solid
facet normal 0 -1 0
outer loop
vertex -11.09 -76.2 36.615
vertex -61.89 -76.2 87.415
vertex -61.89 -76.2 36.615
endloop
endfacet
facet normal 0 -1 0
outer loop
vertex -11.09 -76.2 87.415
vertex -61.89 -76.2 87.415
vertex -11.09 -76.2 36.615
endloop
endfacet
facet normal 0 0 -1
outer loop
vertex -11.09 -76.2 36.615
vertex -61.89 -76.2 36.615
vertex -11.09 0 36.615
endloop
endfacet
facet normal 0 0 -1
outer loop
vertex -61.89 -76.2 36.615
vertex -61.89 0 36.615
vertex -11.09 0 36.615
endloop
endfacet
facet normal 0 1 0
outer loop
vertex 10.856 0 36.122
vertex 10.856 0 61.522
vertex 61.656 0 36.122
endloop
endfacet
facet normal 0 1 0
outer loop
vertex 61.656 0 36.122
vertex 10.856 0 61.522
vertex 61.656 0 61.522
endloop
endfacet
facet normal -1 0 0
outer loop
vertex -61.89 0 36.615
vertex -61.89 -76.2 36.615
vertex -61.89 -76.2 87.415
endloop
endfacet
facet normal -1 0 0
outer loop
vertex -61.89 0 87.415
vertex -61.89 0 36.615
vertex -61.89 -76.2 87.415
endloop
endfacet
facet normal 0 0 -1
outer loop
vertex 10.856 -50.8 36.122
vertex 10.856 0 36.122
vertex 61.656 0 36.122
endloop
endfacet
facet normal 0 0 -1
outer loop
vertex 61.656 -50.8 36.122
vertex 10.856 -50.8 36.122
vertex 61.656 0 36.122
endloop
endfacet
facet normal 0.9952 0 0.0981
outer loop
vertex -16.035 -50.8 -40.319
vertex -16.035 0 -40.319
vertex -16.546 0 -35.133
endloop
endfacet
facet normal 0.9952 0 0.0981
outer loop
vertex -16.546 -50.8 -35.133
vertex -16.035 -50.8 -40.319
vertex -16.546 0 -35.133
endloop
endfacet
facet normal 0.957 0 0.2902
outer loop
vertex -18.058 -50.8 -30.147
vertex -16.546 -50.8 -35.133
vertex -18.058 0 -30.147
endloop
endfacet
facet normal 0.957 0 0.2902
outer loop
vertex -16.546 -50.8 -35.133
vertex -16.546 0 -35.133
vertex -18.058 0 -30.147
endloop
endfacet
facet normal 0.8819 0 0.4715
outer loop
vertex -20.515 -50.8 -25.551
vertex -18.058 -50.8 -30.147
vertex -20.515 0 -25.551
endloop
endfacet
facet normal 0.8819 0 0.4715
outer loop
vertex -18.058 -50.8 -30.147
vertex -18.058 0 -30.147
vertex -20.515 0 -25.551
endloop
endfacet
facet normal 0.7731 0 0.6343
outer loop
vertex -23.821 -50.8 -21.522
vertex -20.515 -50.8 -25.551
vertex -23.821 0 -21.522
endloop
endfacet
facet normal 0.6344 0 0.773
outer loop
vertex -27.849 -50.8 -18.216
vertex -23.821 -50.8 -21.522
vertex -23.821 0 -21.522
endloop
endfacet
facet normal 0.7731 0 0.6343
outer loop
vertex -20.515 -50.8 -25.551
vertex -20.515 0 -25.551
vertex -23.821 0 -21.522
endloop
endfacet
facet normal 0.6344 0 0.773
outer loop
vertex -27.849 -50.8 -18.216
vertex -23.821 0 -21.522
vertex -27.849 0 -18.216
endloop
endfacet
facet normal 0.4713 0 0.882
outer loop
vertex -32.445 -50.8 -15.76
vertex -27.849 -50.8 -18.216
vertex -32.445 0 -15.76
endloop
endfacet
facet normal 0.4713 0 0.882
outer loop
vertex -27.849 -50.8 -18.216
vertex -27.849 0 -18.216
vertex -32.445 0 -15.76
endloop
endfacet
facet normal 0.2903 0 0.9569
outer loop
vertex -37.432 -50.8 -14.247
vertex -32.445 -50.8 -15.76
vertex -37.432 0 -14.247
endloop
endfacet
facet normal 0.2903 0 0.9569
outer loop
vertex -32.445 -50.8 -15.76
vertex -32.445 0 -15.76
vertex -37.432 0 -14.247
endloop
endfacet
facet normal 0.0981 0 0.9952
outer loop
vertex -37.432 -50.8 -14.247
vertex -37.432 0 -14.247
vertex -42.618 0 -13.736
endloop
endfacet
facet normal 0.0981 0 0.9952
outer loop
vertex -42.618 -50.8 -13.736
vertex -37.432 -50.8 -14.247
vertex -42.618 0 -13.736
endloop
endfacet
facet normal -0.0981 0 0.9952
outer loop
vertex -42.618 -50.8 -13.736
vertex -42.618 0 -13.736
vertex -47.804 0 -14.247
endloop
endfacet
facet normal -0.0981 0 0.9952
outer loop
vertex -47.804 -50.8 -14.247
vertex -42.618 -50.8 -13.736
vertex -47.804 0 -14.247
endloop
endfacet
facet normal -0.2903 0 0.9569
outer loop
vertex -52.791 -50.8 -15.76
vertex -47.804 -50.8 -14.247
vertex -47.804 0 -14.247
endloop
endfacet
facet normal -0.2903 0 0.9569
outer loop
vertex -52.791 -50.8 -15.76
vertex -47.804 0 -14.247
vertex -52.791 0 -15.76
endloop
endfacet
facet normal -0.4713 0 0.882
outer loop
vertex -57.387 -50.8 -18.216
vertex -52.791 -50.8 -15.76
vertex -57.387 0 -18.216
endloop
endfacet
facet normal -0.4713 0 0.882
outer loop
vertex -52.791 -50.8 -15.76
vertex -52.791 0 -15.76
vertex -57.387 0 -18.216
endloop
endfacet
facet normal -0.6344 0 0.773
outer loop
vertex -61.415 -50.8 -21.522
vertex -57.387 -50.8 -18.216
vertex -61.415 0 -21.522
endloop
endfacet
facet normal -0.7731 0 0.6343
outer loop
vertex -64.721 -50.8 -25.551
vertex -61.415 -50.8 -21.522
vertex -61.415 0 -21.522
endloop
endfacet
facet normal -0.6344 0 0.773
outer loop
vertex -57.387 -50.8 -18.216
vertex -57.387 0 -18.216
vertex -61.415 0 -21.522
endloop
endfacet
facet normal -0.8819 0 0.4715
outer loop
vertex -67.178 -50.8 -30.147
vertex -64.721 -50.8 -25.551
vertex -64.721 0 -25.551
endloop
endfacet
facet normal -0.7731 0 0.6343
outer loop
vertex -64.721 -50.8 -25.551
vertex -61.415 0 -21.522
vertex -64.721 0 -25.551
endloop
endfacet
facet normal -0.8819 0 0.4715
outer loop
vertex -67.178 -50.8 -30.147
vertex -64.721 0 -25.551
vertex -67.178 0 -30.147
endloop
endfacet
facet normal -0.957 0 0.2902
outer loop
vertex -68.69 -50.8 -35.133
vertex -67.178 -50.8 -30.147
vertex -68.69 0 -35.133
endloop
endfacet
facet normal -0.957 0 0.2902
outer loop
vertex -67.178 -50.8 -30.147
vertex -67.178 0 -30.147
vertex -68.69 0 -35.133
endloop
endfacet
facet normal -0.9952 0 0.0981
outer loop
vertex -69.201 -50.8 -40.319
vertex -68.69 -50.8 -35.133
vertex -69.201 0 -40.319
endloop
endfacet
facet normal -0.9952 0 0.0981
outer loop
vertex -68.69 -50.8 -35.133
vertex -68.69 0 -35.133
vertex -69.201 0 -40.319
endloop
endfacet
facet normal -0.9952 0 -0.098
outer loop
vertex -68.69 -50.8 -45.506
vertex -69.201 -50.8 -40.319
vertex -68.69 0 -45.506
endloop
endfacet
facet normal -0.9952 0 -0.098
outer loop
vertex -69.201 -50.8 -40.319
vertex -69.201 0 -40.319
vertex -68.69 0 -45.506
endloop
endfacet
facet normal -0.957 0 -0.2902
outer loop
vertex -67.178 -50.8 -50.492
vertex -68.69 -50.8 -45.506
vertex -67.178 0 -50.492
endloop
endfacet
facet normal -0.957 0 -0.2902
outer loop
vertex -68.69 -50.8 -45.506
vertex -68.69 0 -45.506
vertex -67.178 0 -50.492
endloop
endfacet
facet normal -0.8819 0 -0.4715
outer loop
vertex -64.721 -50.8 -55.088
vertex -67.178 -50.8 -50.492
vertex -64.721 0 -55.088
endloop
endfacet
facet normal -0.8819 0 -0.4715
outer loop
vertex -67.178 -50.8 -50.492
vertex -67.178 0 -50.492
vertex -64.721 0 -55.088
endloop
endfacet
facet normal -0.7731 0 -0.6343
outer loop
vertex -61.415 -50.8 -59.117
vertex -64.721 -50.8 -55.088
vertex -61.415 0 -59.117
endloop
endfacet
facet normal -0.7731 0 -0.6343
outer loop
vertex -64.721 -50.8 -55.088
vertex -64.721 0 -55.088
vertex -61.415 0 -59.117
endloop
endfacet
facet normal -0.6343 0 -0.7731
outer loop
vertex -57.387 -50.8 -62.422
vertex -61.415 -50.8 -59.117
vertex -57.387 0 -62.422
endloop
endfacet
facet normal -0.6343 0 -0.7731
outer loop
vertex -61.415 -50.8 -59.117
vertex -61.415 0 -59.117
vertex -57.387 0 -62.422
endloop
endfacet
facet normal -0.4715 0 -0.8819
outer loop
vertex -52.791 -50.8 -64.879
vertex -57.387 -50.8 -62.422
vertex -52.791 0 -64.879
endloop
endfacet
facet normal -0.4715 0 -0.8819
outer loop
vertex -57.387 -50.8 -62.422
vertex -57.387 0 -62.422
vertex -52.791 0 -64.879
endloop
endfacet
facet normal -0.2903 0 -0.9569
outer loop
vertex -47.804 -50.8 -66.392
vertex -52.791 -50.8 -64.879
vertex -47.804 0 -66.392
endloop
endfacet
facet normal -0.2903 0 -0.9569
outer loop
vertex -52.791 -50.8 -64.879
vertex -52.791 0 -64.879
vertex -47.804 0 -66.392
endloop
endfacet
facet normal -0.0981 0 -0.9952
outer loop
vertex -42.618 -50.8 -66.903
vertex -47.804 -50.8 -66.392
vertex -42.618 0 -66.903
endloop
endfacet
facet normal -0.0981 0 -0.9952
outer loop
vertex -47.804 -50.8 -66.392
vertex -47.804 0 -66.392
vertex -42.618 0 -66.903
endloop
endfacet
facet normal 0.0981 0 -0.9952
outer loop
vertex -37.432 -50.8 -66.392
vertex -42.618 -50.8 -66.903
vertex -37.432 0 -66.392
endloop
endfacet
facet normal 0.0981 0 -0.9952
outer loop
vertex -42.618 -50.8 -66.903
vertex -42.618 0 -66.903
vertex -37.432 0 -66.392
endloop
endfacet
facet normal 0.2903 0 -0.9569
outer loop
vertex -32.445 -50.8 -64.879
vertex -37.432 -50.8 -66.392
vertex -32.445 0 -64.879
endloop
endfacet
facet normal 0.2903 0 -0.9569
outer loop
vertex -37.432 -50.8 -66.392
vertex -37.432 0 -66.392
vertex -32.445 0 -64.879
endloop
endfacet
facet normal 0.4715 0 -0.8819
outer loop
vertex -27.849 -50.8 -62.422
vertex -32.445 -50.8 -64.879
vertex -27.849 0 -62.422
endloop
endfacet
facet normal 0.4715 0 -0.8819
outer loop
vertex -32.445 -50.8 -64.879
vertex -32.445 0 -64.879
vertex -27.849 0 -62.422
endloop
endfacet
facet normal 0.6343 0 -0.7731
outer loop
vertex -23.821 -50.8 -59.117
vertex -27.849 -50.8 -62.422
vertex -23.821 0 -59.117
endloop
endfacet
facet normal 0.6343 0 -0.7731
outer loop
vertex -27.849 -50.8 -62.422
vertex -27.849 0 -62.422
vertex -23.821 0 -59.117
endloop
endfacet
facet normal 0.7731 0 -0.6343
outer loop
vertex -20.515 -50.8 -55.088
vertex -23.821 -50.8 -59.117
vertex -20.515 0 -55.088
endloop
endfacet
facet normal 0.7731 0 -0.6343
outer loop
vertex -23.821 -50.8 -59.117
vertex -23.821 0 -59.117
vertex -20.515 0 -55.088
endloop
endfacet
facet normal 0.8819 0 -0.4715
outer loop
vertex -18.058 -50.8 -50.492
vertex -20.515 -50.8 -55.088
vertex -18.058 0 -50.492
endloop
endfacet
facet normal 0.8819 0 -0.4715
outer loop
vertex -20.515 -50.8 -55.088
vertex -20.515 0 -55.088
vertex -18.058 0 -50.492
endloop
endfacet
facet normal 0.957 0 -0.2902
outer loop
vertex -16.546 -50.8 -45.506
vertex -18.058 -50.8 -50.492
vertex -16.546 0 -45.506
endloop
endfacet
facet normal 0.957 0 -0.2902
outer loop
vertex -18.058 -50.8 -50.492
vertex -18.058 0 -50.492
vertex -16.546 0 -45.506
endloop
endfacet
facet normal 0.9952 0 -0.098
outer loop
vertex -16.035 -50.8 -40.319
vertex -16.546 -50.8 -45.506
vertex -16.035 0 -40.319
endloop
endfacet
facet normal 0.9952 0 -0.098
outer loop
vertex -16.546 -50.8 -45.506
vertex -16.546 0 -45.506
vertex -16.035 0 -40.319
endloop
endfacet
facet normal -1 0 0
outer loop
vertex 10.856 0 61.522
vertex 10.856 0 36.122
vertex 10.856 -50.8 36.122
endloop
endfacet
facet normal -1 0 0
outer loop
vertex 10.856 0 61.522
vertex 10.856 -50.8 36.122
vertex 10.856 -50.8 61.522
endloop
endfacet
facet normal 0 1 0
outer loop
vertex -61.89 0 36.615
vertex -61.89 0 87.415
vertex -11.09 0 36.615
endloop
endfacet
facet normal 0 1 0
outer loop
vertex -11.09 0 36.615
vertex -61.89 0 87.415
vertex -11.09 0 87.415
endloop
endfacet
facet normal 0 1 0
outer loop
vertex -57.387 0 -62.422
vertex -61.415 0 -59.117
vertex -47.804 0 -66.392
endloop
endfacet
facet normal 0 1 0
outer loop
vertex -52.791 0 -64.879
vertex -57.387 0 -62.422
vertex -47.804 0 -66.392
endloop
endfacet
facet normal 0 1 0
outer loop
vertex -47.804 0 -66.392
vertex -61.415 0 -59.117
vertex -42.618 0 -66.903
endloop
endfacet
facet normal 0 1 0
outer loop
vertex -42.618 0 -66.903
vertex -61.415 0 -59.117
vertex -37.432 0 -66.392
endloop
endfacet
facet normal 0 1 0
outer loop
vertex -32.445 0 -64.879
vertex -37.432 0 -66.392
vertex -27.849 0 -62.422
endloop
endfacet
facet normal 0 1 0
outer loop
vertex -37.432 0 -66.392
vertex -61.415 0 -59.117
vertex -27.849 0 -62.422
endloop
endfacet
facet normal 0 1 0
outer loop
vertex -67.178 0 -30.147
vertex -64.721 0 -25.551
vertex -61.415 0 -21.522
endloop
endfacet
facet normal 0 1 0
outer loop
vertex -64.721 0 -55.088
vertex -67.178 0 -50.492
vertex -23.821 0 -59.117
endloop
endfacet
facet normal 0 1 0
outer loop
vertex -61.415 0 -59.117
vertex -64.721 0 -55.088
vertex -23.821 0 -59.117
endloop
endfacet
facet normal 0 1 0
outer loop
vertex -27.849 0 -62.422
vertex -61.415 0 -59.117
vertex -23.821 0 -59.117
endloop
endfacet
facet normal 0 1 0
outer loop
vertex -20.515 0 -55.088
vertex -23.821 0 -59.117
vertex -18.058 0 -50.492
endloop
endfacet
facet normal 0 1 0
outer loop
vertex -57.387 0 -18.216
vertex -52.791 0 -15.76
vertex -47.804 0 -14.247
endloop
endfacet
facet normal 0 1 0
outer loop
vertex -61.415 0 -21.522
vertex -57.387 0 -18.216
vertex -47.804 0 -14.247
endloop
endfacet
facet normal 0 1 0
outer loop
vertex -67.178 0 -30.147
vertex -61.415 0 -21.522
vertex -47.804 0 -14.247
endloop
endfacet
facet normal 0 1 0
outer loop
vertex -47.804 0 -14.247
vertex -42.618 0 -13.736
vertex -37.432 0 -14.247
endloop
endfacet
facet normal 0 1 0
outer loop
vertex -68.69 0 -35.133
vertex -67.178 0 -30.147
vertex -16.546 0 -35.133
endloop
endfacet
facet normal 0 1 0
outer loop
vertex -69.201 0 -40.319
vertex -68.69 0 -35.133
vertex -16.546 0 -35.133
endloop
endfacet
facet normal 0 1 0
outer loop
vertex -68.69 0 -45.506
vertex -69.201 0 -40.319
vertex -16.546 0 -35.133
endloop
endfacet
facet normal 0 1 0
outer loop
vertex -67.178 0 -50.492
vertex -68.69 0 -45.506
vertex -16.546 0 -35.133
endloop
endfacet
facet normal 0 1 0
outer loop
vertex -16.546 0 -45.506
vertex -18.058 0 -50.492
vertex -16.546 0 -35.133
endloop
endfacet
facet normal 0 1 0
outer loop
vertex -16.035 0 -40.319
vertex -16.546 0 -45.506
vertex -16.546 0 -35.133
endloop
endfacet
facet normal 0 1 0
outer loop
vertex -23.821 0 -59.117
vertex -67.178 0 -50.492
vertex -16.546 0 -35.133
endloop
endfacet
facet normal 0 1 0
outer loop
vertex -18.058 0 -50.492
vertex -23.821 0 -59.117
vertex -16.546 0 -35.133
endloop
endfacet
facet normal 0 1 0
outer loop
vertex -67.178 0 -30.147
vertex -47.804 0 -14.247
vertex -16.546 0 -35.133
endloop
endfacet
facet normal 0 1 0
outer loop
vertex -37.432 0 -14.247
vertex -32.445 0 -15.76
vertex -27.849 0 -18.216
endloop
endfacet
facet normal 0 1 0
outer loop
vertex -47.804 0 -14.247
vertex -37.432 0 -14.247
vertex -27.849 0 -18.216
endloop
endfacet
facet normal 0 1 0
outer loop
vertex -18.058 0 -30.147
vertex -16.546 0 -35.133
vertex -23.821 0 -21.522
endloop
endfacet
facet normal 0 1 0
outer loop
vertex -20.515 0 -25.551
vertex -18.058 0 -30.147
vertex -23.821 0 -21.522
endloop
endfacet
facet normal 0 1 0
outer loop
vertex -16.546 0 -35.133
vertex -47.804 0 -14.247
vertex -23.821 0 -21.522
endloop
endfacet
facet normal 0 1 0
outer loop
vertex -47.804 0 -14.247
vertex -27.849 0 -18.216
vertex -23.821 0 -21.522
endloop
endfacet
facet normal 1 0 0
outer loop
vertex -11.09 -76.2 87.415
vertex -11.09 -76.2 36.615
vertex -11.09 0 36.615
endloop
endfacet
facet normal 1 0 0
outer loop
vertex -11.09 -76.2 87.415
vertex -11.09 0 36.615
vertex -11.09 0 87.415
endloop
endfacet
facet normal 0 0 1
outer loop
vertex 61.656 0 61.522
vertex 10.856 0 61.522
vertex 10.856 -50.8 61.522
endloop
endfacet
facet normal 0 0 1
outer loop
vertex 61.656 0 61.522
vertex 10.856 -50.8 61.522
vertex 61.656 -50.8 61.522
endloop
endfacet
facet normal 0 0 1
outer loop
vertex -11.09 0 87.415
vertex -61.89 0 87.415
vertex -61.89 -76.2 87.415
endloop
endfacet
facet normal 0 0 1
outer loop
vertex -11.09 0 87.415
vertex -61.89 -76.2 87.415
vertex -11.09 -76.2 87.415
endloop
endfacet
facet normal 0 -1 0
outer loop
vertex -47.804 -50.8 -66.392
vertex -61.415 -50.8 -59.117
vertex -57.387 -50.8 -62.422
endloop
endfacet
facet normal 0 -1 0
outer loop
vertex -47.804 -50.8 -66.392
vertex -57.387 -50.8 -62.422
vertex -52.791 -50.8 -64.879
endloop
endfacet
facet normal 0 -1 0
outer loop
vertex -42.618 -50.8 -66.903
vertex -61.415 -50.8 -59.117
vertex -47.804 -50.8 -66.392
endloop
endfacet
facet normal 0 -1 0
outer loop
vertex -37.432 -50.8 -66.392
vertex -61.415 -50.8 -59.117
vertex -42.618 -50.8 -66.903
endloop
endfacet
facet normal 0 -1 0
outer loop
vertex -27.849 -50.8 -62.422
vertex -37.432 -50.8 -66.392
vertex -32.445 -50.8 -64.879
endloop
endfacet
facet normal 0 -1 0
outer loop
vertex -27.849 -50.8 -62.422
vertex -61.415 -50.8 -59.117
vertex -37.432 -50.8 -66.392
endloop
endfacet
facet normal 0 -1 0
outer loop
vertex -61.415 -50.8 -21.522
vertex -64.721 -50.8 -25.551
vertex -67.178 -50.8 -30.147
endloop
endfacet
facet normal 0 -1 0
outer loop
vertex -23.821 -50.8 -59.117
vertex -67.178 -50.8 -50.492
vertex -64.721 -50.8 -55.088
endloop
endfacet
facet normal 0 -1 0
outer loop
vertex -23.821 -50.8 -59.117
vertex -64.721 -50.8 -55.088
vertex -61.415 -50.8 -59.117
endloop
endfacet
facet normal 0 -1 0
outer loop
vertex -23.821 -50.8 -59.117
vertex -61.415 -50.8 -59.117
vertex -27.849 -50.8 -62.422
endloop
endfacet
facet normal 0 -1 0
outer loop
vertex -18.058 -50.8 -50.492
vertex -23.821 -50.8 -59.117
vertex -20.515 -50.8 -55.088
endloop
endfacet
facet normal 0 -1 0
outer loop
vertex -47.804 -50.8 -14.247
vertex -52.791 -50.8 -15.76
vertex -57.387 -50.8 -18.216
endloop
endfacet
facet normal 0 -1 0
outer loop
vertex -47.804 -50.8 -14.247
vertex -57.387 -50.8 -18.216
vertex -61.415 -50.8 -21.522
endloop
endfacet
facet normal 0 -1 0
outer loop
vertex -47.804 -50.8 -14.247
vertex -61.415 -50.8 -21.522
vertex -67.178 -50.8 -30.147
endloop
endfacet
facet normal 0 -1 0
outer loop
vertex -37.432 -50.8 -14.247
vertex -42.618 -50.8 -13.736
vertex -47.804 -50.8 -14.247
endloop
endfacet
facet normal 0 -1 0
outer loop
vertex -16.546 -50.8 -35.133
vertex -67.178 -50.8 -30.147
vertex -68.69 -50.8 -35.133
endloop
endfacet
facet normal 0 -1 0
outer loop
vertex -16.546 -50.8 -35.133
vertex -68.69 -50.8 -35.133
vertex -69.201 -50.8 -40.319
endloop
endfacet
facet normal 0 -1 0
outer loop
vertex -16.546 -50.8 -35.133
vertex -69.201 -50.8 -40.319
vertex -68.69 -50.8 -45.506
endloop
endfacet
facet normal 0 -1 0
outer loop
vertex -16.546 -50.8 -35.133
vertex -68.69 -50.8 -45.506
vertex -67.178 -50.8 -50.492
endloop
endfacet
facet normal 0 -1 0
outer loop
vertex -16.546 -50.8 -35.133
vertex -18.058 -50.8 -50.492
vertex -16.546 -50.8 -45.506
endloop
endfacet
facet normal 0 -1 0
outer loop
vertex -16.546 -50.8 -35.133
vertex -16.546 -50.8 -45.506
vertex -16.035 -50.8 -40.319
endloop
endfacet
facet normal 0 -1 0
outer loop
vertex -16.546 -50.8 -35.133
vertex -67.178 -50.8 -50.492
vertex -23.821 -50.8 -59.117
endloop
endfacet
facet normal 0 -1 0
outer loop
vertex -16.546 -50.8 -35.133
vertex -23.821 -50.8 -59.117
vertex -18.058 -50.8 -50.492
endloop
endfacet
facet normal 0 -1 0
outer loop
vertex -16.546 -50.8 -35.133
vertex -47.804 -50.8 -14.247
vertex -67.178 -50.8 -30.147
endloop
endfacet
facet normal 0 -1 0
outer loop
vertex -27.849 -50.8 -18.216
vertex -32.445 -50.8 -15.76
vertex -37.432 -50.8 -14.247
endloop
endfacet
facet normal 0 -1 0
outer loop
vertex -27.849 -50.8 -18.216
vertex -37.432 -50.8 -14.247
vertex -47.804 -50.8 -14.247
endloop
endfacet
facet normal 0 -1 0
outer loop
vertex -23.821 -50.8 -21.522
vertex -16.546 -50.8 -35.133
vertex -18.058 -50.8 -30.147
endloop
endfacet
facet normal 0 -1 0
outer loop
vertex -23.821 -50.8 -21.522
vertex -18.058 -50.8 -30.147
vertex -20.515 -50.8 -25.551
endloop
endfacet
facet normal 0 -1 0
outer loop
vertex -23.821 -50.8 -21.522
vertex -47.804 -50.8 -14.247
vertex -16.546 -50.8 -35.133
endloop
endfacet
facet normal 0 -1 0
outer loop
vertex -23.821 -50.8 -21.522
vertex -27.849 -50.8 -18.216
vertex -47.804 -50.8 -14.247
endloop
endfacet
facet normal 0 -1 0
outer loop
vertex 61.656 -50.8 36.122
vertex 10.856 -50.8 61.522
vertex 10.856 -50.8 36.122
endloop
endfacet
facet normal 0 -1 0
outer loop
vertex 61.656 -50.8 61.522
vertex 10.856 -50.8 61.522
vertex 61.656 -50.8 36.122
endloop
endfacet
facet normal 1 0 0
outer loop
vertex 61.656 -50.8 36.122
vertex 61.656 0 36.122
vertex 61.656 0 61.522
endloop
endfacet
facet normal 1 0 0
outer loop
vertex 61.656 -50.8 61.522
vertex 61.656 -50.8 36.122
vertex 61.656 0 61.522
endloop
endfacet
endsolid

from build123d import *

# Parameters (mm, degrees)
F0_W      = 50.8
F0_H      = 50.8
F3_DEPTH  = 25.4
F1_W      = 50.8
F1_H      = 25.4
F4_DEPTH  = 50.8
F2_R      = 26.583063
F5_DEPTH  = 50.8
F3_FACE_W = 50.8
F3_FACE_H = 50.8
F6_DEPTH  = 50.8


with BuildPart() as f3:
    # F0 (on Front) → F3 (new body)
    with BuildSketch(Plane.XZ):
        with Locations((-36.490289, 62.014746)):
            Rectangle(F0_W, F0_H)
    extrude(amount=F3_DEPTH)

    # F3_face (on face) → F6 (join)
    with BuildSketch(Plane(origin=(-36.490289, -25.4, 62.014746), x_dir=(1, 0, 0), z_dir=(0, -1, 0))):
        Rectangle(F3_FACE_W, F3_FACE_H)
    extrude(amount=F6_DEPTH)


with BuildPart() as f4:
    # F1 (on Front) → F4 (new body)
    with BuildSketch(Plane.XZ):
        with Locations((36.255861, 48.821618)):
            Rectangle(F1_W, F1_H)
    extrude(amount=F4_DEPTH)


with BuildPart() as f5:
    # F2 (on Front) → F5 (new body)
    with BuildSketch(Plane.XZ):
        with Locations((-42.617988, -40.319465)):
            Circle(F2_R)
    extrude(amount=F5_DEPTH)


solid = Compound([f3.part, f4.part, f5.part])
